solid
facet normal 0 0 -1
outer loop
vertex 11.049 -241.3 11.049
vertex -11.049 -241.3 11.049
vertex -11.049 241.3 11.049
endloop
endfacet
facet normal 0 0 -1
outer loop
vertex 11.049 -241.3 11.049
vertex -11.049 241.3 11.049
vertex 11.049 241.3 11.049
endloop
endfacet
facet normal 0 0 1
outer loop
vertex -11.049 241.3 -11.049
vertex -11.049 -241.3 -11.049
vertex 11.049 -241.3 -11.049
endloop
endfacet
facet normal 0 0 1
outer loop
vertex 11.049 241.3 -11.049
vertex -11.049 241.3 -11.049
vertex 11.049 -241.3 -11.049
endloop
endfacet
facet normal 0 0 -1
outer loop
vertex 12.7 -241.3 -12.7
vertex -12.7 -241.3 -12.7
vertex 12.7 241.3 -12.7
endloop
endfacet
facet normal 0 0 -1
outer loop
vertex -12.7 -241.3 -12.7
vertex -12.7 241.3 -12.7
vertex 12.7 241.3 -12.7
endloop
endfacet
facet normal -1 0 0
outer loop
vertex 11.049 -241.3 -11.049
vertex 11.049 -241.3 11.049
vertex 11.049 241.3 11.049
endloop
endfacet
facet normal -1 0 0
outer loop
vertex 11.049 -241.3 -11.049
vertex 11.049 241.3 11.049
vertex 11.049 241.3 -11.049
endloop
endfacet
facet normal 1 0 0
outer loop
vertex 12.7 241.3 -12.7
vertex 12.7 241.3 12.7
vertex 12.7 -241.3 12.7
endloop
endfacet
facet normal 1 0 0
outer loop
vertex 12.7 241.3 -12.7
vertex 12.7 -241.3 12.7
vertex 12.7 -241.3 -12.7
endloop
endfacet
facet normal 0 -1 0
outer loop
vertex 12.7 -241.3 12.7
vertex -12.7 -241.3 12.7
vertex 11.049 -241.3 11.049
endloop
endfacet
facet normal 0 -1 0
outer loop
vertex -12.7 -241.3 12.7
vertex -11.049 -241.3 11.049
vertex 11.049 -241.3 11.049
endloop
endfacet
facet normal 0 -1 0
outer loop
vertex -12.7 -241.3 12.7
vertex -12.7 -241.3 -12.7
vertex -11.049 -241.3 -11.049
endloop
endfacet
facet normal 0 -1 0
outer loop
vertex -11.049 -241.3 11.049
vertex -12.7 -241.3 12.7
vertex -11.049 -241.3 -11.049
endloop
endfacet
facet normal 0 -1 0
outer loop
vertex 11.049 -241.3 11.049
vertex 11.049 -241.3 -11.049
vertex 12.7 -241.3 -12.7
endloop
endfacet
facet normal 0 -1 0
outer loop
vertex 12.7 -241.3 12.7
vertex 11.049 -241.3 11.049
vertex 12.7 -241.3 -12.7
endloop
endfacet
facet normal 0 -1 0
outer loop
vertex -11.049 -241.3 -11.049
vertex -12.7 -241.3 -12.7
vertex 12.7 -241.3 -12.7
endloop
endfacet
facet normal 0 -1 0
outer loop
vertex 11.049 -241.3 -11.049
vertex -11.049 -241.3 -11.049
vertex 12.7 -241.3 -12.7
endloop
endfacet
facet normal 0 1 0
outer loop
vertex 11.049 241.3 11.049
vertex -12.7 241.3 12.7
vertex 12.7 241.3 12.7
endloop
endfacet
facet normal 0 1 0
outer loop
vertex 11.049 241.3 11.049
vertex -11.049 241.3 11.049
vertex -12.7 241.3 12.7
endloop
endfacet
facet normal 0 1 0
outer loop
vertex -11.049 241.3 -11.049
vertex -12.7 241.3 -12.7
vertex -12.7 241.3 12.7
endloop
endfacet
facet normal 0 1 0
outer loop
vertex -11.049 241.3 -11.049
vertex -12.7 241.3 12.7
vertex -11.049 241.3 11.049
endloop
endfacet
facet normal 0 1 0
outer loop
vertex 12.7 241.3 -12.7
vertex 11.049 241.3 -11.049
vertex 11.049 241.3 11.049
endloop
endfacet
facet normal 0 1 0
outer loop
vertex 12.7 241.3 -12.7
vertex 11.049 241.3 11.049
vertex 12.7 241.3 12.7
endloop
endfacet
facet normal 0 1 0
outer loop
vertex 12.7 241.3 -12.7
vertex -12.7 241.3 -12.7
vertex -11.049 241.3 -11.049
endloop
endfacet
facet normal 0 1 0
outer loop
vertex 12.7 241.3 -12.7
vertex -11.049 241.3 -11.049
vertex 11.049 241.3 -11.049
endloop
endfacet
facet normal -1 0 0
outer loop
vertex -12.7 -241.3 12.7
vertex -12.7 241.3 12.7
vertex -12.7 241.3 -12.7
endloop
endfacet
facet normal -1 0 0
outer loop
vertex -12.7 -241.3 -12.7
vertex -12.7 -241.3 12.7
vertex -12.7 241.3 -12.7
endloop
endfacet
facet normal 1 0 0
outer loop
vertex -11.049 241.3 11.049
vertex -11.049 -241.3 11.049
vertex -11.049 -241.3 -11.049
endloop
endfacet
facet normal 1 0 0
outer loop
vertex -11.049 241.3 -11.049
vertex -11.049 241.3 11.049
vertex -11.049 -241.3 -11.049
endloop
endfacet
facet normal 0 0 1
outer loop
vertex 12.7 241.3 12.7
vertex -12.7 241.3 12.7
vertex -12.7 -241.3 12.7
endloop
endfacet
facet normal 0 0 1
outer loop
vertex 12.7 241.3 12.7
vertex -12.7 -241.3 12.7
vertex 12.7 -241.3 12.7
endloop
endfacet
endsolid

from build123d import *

# Parameters (mm, degrees)
SKETCH1_W           = 25.4
SKETCH1_H           = 25.4
BOSS_EXTRUDE1_DEPTH = 241.3
SKETCH2_W           = 22.098
SKETCH2_H           = 22.098
CUT_EXTRUDE1_DEPTH  = 483.934094883


with BuildPart() as part:
    # Sketch1 → Boss-Extrude1 (new, symmetric)
    with BuildSketch(Plane(origin=(0, 0, 0), x_dir=(1, 0, 0), z_dir=(0, 1, 0))):
        Rectangle(SKETCH1_W, SKETCH1_H)
    extrude(amount=BOSS_EXTRUDE1_DEPTH, both=True)

    # Sketch2 → Cut-Extrude1 (cut, through all)
    with BuildSketch(Plane(origin=(0, 241.3, 0), x_dir=(1, 0, 0), z_dir=(0, 1, 0))):
        Rectangle(SKETCH2_W, SKETCH2_H)
    extrude(amount=-CUT_EXTRUDE1_DEPTH, mode=Mode.SUBTRACT)


solid = part.part
